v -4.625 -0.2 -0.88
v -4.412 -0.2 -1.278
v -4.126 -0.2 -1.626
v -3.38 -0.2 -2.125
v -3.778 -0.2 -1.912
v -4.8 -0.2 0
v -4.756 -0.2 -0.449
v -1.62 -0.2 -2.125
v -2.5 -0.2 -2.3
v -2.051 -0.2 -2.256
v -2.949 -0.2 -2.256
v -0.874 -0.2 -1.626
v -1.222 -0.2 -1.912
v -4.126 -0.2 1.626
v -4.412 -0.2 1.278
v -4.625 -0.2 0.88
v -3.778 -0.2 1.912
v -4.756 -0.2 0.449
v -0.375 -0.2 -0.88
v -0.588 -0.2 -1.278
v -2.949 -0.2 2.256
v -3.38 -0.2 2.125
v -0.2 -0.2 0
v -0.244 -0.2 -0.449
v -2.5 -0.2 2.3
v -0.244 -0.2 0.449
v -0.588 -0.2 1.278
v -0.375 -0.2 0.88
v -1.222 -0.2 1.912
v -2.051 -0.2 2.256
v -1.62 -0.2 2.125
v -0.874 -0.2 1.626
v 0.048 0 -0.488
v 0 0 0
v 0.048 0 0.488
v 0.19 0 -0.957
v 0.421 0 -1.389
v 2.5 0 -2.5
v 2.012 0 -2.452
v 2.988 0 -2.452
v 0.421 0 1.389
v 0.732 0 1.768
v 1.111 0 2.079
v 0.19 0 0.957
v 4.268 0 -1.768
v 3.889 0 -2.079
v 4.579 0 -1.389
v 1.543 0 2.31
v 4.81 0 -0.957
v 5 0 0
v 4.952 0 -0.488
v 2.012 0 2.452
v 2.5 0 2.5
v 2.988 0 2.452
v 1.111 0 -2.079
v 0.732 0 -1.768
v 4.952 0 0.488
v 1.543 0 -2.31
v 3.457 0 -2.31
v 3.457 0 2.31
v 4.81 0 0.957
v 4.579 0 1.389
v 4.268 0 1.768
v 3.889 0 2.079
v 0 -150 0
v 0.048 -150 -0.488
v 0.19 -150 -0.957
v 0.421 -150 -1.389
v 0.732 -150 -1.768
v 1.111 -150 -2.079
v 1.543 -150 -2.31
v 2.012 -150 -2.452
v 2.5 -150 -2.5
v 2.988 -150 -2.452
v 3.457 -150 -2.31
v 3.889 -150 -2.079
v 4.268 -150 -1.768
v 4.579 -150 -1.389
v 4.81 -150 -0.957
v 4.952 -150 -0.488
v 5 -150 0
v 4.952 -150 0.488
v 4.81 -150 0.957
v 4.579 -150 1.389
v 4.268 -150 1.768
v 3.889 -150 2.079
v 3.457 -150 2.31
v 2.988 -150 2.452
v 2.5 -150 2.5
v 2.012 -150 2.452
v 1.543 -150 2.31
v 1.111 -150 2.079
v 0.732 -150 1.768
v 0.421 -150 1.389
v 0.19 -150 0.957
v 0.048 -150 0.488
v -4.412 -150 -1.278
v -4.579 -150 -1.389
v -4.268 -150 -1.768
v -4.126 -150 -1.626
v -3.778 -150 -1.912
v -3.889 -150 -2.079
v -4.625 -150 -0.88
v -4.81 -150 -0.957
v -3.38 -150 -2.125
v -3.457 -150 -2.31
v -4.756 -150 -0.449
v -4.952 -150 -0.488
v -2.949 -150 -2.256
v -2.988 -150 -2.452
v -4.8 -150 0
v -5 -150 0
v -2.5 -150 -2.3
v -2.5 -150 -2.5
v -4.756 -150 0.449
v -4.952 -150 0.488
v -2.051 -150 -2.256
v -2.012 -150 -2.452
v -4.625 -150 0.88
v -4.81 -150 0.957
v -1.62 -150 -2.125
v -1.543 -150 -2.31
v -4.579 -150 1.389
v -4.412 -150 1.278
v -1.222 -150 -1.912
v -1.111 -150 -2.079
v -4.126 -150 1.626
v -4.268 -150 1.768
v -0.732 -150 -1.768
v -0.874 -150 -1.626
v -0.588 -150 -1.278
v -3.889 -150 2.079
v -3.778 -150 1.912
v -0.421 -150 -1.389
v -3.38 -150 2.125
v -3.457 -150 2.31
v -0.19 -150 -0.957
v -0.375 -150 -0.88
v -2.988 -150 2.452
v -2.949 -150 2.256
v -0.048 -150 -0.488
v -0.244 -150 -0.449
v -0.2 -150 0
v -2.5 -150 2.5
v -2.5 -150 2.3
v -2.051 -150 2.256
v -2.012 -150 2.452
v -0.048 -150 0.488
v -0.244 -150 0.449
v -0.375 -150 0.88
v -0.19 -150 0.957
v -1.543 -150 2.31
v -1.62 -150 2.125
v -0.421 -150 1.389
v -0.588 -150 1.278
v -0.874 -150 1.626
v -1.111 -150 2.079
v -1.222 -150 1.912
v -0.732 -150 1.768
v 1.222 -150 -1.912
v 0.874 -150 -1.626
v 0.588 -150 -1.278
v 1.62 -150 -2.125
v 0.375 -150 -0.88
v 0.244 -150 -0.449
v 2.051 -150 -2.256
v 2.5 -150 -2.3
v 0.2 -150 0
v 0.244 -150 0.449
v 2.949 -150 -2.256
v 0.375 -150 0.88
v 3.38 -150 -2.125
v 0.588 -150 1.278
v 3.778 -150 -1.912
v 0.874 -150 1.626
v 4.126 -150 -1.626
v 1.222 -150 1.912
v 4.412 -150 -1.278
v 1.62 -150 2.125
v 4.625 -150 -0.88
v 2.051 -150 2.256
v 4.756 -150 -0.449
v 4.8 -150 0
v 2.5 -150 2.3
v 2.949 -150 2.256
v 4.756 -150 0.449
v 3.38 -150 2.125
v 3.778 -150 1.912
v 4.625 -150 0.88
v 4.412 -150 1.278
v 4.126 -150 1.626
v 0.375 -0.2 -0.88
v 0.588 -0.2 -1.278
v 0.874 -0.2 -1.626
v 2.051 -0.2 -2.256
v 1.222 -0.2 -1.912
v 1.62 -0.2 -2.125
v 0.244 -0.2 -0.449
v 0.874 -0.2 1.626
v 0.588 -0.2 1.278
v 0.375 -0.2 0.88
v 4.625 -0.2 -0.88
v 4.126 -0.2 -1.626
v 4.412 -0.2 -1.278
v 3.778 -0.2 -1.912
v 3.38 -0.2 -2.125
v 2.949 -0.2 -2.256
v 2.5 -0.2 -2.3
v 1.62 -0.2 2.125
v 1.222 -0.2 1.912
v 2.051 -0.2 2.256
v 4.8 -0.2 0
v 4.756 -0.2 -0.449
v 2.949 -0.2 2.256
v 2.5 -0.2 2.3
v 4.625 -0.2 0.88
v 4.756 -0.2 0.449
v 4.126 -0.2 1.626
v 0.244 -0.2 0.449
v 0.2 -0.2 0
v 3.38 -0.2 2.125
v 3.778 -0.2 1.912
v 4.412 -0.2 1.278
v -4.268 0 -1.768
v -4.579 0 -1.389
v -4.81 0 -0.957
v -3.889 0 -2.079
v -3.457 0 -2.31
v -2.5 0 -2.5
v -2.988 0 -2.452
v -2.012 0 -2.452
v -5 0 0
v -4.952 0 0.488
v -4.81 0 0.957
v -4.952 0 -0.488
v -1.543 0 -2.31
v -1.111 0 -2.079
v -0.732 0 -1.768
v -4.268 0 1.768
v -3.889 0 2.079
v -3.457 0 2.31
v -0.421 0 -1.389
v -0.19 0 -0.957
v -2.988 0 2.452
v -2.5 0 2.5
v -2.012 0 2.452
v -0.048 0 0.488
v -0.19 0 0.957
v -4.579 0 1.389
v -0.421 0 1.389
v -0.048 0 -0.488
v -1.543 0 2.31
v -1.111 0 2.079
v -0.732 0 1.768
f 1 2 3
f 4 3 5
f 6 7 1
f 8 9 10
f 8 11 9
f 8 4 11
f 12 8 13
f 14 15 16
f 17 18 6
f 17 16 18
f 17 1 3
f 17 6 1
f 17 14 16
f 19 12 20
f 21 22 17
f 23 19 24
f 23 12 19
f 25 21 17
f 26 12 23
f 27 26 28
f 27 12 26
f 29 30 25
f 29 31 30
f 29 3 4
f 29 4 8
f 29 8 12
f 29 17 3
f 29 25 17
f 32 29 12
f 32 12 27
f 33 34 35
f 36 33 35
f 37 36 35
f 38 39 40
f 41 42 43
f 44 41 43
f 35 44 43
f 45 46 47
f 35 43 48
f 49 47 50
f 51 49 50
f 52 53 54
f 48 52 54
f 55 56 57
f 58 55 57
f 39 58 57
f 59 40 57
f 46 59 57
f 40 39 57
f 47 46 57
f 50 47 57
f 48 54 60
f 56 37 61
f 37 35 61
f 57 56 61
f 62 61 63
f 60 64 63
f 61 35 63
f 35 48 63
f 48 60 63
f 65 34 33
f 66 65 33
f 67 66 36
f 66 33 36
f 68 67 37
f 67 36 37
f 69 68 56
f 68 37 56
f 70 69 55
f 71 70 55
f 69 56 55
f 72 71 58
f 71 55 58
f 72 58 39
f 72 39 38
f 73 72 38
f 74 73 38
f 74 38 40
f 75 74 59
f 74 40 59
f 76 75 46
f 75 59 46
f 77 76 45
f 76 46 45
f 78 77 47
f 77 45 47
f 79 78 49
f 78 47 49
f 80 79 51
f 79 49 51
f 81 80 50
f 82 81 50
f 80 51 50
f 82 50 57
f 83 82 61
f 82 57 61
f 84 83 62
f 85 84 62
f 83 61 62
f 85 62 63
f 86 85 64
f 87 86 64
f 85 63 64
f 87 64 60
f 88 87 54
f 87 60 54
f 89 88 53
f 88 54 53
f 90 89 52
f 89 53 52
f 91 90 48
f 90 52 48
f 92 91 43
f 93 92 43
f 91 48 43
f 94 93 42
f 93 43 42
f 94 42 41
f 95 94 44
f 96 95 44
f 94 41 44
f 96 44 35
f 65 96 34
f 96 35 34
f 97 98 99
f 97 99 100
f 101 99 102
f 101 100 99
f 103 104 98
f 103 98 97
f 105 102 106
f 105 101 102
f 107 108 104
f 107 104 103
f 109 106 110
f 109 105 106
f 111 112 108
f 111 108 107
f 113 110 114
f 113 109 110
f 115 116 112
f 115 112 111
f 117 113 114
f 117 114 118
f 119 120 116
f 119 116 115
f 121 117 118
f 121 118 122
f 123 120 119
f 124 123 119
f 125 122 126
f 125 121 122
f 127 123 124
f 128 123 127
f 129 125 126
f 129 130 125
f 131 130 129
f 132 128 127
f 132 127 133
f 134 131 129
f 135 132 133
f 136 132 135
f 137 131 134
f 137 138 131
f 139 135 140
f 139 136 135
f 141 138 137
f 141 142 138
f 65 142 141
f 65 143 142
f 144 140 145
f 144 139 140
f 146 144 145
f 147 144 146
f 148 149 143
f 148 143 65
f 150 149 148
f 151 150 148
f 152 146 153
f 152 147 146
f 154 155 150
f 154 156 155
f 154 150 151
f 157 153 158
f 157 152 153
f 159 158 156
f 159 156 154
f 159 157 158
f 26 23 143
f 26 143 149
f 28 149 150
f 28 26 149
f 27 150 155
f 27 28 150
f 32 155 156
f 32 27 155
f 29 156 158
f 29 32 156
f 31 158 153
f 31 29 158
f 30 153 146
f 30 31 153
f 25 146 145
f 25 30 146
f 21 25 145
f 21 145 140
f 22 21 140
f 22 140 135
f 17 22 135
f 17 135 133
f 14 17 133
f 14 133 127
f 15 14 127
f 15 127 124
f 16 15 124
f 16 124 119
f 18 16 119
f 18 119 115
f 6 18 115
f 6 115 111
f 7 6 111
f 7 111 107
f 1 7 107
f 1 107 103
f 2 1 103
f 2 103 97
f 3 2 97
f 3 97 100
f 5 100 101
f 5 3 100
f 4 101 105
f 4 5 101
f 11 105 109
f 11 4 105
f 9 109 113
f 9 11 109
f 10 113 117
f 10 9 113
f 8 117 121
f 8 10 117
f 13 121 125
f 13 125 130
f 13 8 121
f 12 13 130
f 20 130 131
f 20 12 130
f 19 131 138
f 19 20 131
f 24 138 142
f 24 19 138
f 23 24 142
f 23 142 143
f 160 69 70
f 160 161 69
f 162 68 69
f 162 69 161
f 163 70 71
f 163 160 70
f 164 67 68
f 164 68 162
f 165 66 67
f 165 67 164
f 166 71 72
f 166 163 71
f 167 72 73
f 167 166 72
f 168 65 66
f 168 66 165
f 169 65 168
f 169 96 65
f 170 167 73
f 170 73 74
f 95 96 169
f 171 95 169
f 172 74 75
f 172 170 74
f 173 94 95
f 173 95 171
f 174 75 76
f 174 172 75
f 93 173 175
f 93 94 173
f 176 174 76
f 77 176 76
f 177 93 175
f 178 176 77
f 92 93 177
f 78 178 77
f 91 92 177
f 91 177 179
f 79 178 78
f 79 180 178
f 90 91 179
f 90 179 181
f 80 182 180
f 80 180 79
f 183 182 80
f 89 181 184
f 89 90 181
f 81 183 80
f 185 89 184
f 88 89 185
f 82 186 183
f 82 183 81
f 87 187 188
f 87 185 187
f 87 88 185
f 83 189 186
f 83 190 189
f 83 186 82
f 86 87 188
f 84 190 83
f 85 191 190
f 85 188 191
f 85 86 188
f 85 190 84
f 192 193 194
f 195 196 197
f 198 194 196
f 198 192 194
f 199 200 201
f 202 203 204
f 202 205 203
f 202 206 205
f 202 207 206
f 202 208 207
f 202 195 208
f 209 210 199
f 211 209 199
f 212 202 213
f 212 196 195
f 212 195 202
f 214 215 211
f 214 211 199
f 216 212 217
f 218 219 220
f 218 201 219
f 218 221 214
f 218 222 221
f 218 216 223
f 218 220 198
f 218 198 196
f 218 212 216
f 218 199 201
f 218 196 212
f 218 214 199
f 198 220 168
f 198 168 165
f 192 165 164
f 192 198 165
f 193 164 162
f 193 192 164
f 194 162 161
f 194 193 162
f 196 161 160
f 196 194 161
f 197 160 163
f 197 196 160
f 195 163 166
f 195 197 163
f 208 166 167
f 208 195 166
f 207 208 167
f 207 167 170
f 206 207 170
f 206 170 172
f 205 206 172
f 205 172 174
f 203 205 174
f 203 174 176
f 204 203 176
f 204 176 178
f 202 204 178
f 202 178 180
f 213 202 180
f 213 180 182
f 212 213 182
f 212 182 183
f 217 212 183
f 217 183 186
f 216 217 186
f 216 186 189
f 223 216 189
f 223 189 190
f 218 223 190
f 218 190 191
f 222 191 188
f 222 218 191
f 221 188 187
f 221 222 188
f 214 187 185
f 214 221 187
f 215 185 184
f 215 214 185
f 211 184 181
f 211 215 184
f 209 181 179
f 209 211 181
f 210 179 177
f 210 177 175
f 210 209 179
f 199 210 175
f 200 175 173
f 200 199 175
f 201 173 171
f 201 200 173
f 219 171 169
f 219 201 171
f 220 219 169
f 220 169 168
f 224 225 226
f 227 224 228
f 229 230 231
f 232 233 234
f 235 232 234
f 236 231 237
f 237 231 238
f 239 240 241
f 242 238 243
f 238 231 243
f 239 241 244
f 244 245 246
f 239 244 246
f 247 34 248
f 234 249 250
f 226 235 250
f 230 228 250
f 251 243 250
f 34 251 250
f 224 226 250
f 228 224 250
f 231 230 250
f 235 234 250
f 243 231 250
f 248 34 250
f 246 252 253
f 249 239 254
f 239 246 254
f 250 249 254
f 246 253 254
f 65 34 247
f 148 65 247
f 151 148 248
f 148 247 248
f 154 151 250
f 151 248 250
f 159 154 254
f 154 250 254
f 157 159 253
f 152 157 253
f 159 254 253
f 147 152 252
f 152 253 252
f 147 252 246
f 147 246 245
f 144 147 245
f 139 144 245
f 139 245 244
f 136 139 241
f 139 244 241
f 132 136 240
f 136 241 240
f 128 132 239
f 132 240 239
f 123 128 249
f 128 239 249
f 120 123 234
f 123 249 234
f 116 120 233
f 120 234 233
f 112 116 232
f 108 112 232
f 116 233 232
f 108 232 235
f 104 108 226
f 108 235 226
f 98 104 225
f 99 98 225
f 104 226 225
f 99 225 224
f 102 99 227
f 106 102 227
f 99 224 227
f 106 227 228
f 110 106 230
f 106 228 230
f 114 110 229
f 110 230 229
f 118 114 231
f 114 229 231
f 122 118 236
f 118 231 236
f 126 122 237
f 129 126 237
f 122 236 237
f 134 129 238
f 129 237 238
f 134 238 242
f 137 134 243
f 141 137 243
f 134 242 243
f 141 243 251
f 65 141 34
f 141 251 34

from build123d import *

# Parameters (mm, degrees)
F0_R     = 2.5
F1_DEPTH = 150
F2_T     = -0.2
F2_2_T   = -0.2


with BuildPart() as f1:
    # F0 (on Front) → F1 (new body)
    with BuildSketch(Plane.XZ):
        with Locations((-2.5, 0)):
            Circle(F0_R)
    extrude(amount=F1_DEPTH)

    # F2
    f2_openings = [f1.faces().sort_by_distance(p)[0] for p in [
        (-2.5, -150, 0),
    ]]
    offset(amount=F2_T, openings=f2_openings)


with BuildPart() as f1b:
    # F0 (on Front) → F1, piece 2 (new body)
    with BuildSketch(Plane.XZ):
        with BuildLine():
            ThreePointArc((5, 0), (2.5, 2.5), (0, 0))
            ThreePointArc((0, 0), (2.5, -2.5), (5, 0))
        make_face()
    extrude(amount=F1_DEPTH)

    # F2#2
    f2_2_openings = [f1b.faces().sort_by_distance(p)[0] for p in [
        (2.5, -150, 0),
    ]]
    offset(amount=F2_2_T, openings=f2_2_openings)


solid = Compound([f1.part, f1b.part])
